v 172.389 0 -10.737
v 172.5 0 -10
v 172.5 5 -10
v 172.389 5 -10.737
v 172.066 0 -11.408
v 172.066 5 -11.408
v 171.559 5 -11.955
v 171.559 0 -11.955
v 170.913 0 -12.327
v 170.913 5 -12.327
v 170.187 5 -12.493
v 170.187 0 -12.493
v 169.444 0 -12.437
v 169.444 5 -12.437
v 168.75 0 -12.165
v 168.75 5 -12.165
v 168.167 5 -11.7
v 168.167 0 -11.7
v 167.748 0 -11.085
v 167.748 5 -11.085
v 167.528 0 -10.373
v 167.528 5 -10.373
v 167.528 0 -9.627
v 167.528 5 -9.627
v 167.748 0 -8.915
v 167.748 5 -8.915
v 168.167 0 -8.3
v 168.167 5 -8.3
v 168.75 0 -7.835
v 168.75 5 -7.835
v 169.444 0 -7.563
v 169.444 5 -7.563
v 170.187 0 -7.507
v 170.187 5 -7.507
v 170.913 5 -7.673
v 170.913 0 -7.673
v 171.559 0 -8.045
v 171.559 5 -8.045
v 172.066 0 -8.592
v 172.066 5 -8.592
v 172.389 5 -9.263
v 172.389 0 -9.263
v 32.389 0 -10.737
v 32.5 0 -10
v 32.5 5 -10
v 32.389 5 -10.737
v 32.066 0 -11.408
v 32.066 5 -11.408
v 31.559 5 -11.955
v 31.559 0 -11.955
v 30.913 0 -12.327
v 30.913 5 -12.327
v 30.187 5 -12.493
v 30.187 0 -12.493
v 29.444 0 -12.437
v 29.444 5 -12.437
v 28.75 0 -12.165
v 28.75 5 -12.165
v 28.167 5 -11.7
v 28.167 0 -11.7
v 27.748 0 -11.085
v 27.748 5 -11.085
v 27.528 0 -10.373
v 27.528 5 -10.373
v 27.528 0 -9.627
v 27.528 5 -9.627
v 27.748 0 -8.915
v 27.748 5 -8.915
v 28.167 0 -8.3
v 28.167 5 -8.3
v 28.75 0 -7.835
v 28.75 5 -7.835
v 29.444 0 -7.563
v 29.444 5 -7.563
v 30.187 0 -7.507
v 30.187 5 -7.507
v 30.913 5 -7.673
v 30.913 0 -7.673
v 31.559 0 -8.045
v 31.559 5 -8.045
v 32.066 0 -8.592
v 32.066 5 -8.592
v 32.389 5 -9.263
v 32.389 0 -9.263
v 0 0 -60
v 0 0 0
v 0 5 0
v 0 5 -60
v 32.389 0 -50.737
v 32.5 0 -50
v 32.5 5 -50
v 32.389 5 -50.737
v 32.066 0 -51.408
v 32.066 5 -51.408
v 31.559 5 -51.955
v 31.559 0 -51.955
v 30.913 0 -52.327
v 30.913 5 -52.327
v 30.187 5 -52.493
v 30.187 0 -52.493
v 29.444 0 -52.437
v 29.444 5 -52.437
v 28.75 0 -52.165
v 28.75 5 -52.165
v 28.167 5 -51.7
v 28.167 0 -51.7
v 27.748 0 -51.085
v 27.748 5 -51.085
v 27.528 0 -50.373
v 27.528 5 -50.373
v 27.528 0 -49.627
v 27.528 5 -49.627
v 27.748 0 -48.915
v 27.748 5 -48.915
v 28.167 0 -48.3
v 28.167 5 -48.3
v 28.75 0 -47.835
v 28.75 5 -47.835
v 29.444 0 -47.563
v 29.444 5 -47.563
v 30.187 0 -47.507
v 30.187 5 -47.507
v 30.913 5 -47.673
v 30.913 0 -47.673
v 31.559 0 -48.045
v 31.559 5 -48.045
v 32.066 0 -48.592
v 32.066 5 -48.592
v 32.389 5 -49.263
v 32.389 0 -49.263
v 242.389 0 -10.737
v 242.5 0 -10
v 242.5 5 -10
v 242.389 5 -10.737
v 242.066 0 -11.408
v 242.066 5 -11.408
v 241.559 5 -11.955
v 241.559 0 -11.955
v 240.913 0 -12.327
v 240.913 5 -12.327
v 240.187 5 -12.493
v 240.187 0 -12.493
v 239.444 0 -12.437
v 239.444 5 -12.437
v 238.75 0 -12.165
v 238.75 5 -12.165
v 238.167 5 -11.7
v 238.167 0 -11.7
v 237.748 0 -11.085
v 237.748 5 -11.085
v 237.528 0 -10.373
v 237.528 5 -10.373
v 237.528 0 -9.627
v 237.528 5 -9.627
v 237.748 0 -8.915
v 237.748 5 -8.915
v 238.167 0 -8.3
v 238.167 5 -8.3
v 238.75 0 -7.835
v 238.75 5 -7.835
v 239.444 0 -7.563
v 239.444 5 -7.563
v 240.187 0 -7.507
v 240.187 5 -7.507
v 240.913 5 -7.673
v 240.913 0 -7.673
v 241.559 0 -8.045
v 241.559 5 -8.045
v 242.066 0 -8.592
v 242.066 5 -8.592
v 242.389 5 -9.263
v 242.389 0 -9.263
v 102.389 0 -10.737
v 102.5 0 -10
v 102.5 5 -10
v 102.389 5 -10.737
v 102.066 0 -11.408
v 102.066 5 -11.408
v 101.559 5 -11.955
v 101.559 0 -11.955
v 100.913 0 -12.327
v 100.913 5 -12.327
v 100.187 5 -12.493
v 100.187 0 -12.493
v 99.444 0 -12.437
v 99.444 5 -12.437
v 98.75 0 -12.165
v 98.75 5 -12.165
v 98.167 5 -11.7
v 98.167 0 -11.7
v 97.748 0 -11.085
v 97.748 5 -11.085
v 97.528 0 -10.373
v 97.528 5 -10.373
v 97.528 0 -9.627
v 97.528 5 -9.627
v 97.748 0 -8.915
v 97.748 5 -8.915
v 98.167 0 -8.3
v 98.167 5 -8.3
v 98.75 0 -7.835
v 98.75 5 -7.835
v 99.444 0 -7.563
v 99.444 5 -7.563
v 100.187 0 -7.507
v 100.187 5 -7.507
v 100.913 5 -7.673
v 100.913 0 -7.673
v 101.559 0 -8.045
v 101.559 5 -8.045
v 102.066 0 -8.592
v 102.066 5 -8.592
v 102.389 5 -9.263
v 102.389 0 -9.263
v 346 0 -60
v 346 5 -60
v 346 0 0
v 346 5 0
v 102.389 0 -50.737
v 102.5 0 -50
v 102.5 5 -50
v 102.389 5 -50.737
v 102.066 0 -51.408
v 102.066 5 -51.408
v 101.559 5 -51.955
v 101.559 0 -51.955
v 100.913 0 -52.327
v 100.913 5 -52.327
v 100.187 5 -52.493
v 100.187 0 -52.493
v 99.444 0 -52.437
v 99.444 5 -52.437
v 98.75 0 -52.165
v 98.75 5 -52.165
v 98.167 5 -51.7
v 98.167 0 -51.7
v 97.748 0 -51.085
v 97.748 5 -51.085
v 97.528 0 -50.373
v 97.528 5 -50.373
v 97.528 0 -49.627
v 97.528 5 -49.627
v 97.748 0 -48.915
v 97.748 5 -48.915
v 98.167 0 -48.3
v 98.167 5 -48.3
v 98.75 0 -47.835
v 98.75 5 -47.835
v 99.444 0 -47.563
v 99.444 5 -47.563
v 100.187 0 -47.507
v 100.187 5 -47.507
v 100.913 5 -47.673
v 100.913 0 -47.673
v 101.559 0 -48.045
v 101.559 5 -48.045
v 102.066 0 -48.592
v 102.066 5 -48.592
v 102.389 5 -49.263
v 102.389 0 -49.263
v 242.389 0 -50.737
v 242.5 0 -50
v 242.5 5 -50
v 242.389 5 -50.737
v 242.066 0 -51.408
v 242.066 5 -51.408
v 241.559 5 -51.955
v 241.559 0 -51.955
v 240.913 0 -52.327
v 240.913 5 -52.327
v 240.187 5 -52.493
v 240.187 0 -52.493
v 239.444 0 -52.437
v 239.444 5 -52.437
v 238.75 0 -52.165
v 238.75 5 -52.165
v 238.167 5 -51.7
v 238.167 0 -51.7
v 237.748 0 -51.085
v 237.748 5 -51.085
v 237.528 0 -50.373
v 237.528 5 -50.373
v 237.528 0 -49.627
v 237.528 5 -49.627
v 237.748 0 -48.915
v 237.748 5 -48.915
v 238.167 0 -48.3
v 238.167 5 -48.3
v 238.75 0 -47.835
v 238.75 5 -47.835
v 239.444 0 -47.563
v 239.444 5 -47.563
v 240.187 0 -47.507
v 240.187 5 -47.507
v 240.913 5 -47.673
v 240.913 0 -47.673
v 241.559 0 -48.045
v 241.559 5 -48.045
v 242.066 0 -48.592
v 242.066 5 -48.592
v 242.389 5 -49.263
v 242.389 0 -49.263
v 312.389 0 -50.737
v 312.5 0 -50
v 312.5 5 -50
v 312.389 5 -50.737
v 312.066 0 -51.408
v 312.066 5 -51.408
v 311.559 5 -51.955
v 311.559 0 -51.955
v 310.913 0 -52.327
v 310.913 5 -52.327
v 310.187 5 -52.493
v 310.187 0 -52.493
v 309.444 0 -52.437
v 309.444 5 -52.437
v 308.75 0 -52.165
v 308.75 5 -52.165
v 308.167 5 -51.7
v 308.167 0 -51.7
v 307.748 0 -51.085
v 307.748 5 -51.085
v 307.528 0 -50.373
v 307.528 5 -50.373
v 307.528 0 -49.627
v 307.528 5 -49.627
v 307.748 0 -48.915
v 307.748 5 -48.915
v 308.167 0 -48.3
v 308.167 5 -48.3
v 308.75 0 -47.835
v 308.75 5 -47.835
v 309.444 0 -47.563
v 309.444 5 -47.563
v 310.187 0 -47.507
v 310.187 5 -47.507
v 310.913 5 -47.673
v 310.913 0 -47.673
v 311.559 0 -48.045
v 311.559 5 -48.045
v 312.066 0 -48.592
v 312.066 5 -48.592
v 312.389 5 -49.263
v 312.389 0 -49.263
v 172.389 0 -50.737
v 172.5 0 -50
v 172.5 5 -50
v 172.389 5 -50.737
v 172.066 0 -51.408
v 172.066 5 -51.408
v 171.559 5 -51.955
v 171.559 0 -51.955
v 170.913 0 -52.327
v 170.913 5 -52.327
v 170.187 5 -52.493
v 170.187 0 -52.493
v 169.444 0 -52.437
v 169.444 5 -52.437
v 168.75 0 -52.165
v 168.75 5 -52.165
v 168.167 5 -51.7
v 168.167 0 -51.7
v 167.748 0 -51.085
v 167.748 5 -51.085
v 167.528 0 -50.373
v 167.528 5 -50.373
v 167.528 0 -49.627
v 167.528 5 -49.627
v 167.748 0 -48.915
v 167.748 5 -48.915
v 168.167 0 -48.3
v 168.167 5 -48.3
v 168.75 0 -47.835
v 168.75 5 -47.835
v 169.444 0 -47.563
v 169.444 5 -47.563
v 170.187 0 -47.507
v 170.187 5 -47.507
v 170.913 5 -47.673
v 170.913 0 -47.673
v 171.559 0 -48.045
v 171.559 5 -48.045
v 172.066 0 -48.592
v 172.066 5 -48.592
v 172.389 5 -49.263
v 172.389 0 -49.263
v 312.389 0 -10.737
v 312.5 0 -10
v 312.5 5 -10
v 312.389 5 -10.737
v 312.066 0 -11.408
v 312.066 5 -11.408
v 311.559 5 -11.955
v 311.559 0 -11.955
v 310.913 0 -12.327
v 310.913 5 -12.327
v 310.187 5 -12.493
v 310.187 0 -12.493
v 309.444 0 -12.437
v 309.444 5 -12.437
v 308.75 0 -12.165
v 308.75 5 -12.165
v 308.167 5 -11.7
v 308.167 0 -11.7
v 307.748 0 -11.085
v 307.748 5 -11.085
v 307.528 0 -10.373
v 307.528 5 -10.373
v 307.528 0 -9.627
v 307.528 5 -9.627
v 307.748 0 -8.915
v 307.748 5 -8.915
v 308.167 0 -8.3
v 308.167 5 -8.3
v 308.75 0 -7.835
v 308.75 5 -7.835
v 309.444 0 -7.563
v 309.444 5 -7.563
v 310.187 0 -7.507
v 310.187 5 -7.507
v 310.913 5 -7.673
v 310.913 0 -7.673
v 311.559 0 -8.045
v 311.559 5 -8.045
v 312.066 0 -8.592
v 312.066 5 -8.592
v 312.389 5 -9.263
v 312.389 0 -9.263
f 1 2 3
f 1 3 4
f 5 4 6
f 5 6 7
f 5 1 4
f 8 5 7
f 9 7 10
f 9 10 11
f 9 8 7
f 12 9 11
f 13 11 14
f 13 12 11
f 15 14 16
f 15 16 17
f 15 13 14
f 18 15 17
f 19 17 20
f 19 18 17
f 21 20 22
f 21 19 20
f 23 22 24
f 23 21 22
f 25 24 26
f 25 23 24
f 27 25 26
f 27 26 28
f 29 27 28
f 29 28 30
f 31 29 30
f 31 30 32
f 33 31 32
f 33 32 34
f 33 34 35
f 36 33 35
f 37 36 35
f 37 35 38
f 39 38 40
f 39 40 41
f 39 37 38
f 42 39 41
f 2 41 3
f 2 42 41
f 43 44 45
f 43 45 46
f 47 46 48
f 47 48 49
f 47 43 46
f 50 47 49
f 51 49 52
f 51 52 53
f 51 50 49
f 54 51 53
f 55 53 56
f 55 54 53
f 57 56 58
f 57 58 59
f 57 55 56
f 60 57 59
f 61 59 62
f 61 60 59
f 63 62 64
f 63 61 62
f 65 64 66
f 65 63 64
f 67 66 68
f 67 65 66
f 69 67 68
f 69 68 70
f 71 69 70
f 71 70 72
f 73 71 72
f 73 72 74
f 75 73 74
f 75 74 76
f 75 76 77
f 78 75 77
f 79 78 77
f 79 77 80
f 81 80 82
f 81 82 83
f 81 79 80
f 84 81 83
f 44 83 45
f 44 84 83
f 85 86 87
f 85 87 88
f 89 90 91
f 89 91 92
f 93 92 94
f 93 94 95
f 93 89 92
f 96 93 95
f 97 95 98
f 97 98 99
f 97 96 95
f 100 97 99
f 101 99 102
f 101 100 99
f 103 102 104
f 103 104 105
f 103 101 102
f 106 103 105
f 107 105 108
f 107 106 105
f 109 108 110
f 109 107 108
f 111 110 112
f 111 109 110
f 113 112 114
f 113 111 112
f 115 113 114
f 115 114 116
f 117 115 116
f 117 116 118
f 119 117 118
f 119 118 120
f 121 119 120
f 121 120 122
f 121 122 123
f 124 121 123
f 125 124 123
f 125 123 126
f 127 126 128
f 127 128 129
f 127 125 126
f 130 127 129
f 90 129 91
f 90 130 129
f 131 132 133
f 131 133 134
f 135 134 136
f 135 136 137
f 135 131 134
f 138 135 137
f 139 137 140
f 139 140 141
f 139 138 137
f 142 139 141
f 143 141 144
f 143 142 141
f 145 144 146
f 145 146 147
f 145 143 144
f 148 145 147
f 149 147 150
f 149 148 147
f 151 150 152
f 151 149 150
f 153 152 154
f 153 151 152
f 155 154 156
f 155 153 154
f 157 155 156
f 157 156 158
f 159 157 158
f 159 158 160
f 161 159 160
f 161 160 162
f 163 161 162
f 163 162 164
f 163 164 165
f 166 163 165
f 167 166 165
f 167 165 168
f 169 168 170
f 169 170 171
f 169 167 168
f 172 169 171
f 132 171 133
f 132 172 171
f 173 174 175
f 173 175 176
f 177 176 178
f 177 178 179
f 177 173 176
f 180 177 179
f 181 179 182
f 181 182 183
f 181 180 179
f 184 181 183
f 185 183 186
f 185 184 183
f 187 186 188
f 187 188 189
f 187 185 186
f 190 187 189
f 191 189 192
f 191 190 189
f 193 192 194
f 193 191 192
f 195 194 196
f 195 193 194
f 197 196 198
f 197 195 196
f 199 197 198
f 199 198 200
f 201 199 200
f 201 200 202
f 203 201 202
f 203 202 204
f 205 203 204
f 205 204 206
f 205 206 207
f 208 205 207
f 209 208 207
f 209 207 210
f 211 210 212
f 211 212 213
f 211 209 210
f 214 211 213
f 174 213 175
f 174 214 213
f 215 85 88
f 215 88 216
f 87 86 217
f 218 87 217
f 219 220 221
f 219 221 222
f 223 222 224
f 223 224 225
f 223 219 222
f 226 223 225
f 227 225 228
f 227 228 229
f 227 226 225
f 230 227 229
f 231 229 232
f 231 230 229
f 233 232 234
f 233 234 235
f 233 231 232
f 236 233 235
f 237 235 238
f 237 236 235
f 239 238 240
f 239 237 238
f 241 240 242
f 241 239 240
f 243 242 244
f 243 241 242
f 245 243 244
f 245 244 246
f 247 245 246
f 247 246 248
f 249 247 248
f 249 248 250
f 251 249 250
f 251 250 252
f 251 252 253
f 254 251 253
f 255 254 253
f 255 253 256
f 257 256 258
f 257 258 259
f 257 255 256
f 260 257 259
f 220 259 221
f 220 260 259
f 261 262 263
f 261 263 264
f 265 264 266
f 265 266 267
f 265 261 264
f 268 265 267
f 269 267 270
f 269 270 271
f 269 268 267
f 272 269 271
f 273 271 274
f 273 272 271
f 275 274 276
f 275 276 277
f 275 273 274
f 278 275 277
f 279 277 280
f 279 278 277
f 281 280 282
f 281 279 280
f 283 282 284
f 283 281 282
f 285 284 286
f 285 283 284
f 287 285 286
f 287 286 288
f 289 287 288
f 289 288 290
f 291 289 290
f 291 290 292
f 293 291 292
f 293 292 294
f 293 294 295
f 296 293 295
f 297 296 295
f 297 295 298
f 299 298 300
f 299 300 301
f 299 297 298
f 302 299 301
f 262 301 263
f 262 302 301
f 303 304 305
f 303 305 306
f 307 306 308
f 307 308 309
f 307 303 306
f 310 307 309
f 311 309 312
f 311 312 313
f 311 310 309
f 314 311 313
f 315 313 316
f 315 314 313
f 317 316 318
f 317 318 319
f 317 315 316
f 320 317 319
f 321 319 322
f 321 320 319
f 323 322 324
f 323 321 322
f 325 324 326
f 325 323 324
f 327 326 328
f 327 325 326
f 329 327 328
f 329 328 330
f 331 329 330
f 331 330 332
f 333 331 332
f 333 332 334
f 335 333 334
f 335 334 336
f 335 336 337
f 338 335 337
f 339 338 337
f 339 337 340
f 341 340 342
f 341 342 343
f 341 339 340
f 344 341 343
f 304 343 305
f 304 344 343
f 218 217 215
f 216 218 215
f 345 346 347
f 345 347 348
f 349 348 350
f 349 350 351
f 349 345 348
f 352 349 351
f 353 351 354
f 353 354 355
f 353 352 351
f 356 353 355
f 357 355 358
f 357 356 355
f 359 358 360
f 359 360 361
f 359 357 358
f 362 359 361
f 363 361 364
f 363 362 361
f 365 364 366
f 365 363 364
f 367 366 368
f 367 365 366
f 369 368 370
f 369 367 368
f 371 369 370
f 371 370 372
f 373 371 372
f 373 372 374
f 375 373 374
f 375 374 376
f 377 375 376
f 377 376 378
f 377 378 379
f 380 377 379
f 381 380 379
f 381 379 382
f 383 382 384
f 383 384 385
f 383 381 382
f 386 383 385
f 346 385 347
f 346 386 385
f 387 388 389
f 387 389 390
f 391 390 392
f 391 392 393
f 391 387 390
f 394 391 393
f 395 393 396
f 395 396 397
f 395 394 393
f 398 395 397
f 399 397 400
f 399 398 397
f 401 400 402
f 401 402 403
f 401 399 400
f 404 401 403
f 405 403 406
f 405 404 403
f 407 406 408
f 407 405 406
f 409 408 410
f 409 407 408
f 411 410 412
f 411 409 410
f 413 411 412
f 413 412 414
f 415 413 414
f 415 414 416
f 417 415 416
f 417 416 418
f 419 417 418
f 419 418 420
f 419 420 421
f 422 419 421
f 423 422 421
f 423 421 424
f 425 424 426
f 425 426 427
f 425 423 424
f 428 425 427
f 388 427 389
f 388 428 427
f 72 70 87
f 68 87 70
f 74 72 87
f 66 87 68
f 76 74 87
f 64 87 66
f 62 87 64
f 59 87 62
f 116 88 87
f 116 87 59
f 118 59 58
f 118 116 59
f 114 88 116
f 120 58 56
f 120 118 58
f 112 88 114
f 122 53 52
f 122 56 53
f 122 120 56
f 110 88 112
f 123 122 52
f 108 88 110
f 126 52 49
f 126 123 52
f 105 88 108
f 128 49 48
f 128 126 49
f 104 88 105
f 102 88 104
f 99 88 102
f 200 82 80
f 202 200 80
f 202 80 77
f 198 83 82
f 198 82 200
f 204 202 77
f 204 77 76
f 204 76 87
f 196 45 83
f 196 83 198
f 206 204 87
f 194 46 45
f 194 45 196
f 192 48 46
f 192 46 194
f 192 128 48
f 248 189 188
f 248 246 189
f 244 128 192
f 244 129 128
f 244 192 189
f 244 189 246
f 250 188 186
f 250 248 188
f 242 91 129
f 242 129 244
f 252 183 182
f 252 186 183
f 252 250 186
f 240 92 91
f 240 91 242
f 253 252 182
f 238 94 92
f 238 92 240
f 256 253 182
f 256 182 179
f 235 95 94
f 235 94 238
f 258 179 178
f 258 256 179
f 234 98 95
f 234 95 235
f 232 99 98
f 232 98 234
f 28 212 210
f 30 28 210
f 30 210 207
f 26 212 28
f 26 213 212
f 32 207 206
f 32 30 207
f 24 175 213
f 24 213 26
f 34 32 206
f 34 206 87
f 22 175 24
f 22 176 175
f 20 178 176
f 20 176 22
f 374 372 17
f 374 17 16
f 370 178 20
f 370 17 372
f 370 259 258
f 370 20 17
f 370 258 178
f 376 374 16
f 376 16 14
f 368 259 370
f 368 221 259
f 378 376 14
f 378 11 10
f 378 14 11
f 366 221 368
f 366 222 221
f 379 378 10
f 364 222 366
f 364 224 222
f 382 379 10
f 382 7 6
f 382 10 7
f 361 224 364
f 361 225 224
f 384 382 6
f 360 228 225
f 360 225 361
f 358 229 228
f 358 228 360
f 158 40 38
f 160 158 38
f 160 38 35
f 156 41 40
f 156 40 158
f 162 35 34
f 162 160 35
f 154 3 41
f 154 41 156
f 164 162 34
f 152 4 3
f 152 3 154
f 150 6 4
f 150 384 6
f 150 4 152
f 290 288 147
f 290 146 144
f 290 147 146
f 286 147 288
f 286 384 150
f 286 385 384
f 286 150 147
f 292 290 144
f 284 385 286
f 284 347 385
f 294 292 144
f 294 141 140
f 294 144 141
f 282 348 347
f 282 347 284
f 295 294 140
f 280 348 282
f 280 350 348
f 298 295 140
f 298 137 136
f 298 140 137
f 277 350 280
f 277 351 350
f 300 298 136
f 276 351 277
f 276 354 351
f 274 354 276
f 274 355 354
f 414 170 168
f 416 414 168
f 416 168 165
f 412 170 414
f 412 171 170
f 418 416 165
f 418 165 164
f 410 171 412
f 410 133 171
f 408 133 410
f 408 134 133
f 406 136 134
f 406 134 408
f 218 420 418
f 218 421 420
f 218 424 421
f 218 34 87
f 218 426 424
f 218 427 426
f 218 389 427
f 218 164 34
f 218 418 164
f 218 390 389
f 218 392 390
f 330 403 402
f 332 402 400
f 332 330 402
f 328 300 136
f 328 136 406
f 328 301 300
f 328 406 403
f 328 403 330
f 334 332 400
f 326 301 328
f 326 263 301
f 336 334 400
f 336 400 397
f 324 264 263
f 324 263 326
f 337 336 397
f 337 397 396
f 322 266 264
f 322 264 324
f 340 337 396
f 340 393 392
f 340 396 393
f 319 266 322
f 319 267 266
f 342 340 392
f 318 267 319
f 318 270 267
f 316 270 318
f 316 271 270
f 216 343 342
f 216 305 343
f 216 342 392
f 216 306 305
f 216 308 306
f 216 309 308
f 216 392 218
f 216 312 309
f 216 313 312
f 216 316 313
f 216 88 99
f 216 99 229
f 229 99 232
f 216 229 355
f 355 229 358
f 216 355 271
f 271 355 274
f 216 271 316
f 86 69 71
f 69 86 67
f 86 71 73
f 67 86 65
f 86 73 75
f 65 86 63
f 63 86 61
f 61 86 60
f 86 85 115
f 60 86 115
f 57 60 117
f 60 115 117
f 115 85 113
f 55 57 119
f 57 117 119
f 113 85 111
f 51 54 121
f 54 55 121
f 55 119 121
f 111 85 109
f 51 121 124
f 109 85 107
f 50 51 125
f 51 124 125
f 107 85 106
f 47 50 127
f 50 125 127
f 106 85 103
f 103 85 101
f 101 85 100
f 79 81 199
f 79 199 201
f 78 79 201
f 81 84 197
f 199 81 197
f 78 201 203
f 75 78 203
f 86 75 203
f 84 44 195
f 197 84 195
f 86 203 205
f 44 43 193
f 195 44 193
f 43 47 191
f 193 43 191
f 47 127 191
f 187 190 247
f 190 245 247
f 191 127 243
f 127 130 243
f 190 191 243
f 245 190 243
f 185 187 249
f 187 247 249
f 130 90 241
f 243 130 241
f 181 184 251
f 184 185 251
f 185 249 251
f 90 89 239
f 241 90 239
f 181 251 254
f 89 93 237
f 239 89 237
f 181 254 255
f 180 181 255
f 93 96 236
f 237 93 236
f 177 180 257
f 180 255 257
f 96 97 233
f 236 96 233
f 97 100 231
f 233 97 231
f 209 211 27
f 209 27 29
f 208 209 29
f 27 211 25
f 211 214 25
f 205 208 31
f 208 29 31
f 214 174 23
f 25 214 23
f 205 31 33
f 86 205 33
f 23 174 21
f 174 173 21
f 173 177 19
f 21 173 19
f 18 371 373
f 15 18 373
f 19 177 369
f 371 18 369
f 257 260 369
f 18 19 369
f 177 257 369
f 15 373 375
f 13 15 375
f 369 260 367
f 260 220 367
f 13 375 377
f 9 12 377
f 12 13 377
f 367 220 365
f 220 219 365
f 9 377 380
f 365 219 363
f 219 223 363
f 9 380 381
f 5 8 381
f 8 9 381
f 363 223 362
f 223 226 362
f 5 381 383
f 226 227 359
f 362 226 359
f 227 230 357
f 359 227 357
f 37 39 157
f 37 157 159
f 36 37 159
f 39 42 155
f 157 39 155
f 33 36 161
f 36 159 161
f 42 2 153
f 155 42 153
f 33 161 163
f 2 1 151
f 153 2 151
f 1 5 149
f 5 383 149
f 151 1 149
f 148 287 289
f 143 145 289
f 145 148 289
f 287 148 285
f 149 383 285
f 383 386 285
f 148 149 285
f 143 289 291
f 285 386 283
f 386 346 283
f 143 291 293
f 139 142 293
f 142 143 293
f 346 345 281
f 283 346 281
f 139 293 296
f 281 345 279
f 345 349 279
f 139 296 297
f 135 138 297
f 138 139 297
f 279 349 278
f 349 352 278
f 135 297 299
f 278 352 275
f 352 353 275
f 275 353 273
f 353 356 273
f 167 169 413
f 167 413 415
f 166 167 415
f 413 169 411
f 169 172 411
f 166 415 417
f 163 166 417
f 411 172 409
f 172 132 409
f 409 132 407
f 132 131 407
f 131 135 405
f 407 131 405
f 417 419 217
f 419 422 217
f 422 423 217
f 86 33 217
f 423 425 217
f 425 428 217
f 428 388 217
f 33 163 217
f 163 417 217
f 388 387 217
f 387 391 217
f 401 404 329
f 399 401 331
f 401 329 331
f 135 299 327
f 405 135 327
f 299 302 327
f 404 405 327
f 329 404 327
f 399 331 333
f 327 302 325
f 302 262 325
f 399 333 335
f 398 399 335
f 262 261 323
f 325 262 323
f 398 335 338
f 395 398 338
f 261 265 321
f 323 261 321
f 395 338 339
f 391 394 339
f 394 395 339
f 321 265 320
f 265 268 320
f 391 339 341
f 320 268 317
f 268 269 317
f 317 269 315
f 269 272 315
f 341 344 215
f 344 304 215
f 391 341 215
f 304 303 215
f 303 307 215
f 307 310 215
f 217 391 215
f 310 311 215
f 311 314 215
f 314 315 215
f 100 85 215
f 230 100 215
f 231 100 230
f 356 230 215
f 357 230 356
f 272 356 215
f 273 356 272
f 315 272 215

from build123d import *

# Parameters (mm, degrees)
SKETCH1_W           = 346
SKETCH1_H           = 60
SKETCH1_R           = 2.5
BOSS_EXTRUDE1_DEPTH = 5


with BuildPart() as part:
    # Sketch1 → Boss-Extrude1 (new body)
    with BuildSketch(Plane(origin=(0, 0, 0), x_dir=(1, 0, 0), z_dir=(0, 1, 0))):
        with Locations((173, 30)):
            Rectangle(SKETCH1_W, SKETCH1_H)
        with Locations((30, 50)):
            Circle(SKETCH1_R, mode=Mode.SUBTRACT)
        with Locations((100, 50)):
            Circle(SKETCH1_R, mode=Mode.SUBTRACT)
        with Locations((170, 50)):
            Circle(SKETCH1_R, mode=Mode.SUBTRACT)
        with Locations((240, 50)):
            Circle(SKETCH1_R, mode=Mode.SUBTRACT)
        with Locations((310, 50)):
            Circle(SKETCH1_R, mode=Mode.SUBTRACT)
        with Locations((310, 10)):
            Circle(SKETCH1_R, mode=Mode.SUBTRACT)
        with Locations((240, 10)):
            Circle(SKETCH1_R, mode=Mode.SUBTRACT)
        with Locations((170, 10)):
            Circle(SKETCH1_R, mode=Mode.SUBTRACT)
        with Locations((100, 10)):
            Circle(SKETCH1_R, mode=Mode.SUBTRACT)
        with Locations((30, 10)):
            Circle(SKETCH1_R, mode=Mode.SUBTRACT)
    extrude(amount=BOSS_EXTRUDE1_DEPTH)


solid = part.part
